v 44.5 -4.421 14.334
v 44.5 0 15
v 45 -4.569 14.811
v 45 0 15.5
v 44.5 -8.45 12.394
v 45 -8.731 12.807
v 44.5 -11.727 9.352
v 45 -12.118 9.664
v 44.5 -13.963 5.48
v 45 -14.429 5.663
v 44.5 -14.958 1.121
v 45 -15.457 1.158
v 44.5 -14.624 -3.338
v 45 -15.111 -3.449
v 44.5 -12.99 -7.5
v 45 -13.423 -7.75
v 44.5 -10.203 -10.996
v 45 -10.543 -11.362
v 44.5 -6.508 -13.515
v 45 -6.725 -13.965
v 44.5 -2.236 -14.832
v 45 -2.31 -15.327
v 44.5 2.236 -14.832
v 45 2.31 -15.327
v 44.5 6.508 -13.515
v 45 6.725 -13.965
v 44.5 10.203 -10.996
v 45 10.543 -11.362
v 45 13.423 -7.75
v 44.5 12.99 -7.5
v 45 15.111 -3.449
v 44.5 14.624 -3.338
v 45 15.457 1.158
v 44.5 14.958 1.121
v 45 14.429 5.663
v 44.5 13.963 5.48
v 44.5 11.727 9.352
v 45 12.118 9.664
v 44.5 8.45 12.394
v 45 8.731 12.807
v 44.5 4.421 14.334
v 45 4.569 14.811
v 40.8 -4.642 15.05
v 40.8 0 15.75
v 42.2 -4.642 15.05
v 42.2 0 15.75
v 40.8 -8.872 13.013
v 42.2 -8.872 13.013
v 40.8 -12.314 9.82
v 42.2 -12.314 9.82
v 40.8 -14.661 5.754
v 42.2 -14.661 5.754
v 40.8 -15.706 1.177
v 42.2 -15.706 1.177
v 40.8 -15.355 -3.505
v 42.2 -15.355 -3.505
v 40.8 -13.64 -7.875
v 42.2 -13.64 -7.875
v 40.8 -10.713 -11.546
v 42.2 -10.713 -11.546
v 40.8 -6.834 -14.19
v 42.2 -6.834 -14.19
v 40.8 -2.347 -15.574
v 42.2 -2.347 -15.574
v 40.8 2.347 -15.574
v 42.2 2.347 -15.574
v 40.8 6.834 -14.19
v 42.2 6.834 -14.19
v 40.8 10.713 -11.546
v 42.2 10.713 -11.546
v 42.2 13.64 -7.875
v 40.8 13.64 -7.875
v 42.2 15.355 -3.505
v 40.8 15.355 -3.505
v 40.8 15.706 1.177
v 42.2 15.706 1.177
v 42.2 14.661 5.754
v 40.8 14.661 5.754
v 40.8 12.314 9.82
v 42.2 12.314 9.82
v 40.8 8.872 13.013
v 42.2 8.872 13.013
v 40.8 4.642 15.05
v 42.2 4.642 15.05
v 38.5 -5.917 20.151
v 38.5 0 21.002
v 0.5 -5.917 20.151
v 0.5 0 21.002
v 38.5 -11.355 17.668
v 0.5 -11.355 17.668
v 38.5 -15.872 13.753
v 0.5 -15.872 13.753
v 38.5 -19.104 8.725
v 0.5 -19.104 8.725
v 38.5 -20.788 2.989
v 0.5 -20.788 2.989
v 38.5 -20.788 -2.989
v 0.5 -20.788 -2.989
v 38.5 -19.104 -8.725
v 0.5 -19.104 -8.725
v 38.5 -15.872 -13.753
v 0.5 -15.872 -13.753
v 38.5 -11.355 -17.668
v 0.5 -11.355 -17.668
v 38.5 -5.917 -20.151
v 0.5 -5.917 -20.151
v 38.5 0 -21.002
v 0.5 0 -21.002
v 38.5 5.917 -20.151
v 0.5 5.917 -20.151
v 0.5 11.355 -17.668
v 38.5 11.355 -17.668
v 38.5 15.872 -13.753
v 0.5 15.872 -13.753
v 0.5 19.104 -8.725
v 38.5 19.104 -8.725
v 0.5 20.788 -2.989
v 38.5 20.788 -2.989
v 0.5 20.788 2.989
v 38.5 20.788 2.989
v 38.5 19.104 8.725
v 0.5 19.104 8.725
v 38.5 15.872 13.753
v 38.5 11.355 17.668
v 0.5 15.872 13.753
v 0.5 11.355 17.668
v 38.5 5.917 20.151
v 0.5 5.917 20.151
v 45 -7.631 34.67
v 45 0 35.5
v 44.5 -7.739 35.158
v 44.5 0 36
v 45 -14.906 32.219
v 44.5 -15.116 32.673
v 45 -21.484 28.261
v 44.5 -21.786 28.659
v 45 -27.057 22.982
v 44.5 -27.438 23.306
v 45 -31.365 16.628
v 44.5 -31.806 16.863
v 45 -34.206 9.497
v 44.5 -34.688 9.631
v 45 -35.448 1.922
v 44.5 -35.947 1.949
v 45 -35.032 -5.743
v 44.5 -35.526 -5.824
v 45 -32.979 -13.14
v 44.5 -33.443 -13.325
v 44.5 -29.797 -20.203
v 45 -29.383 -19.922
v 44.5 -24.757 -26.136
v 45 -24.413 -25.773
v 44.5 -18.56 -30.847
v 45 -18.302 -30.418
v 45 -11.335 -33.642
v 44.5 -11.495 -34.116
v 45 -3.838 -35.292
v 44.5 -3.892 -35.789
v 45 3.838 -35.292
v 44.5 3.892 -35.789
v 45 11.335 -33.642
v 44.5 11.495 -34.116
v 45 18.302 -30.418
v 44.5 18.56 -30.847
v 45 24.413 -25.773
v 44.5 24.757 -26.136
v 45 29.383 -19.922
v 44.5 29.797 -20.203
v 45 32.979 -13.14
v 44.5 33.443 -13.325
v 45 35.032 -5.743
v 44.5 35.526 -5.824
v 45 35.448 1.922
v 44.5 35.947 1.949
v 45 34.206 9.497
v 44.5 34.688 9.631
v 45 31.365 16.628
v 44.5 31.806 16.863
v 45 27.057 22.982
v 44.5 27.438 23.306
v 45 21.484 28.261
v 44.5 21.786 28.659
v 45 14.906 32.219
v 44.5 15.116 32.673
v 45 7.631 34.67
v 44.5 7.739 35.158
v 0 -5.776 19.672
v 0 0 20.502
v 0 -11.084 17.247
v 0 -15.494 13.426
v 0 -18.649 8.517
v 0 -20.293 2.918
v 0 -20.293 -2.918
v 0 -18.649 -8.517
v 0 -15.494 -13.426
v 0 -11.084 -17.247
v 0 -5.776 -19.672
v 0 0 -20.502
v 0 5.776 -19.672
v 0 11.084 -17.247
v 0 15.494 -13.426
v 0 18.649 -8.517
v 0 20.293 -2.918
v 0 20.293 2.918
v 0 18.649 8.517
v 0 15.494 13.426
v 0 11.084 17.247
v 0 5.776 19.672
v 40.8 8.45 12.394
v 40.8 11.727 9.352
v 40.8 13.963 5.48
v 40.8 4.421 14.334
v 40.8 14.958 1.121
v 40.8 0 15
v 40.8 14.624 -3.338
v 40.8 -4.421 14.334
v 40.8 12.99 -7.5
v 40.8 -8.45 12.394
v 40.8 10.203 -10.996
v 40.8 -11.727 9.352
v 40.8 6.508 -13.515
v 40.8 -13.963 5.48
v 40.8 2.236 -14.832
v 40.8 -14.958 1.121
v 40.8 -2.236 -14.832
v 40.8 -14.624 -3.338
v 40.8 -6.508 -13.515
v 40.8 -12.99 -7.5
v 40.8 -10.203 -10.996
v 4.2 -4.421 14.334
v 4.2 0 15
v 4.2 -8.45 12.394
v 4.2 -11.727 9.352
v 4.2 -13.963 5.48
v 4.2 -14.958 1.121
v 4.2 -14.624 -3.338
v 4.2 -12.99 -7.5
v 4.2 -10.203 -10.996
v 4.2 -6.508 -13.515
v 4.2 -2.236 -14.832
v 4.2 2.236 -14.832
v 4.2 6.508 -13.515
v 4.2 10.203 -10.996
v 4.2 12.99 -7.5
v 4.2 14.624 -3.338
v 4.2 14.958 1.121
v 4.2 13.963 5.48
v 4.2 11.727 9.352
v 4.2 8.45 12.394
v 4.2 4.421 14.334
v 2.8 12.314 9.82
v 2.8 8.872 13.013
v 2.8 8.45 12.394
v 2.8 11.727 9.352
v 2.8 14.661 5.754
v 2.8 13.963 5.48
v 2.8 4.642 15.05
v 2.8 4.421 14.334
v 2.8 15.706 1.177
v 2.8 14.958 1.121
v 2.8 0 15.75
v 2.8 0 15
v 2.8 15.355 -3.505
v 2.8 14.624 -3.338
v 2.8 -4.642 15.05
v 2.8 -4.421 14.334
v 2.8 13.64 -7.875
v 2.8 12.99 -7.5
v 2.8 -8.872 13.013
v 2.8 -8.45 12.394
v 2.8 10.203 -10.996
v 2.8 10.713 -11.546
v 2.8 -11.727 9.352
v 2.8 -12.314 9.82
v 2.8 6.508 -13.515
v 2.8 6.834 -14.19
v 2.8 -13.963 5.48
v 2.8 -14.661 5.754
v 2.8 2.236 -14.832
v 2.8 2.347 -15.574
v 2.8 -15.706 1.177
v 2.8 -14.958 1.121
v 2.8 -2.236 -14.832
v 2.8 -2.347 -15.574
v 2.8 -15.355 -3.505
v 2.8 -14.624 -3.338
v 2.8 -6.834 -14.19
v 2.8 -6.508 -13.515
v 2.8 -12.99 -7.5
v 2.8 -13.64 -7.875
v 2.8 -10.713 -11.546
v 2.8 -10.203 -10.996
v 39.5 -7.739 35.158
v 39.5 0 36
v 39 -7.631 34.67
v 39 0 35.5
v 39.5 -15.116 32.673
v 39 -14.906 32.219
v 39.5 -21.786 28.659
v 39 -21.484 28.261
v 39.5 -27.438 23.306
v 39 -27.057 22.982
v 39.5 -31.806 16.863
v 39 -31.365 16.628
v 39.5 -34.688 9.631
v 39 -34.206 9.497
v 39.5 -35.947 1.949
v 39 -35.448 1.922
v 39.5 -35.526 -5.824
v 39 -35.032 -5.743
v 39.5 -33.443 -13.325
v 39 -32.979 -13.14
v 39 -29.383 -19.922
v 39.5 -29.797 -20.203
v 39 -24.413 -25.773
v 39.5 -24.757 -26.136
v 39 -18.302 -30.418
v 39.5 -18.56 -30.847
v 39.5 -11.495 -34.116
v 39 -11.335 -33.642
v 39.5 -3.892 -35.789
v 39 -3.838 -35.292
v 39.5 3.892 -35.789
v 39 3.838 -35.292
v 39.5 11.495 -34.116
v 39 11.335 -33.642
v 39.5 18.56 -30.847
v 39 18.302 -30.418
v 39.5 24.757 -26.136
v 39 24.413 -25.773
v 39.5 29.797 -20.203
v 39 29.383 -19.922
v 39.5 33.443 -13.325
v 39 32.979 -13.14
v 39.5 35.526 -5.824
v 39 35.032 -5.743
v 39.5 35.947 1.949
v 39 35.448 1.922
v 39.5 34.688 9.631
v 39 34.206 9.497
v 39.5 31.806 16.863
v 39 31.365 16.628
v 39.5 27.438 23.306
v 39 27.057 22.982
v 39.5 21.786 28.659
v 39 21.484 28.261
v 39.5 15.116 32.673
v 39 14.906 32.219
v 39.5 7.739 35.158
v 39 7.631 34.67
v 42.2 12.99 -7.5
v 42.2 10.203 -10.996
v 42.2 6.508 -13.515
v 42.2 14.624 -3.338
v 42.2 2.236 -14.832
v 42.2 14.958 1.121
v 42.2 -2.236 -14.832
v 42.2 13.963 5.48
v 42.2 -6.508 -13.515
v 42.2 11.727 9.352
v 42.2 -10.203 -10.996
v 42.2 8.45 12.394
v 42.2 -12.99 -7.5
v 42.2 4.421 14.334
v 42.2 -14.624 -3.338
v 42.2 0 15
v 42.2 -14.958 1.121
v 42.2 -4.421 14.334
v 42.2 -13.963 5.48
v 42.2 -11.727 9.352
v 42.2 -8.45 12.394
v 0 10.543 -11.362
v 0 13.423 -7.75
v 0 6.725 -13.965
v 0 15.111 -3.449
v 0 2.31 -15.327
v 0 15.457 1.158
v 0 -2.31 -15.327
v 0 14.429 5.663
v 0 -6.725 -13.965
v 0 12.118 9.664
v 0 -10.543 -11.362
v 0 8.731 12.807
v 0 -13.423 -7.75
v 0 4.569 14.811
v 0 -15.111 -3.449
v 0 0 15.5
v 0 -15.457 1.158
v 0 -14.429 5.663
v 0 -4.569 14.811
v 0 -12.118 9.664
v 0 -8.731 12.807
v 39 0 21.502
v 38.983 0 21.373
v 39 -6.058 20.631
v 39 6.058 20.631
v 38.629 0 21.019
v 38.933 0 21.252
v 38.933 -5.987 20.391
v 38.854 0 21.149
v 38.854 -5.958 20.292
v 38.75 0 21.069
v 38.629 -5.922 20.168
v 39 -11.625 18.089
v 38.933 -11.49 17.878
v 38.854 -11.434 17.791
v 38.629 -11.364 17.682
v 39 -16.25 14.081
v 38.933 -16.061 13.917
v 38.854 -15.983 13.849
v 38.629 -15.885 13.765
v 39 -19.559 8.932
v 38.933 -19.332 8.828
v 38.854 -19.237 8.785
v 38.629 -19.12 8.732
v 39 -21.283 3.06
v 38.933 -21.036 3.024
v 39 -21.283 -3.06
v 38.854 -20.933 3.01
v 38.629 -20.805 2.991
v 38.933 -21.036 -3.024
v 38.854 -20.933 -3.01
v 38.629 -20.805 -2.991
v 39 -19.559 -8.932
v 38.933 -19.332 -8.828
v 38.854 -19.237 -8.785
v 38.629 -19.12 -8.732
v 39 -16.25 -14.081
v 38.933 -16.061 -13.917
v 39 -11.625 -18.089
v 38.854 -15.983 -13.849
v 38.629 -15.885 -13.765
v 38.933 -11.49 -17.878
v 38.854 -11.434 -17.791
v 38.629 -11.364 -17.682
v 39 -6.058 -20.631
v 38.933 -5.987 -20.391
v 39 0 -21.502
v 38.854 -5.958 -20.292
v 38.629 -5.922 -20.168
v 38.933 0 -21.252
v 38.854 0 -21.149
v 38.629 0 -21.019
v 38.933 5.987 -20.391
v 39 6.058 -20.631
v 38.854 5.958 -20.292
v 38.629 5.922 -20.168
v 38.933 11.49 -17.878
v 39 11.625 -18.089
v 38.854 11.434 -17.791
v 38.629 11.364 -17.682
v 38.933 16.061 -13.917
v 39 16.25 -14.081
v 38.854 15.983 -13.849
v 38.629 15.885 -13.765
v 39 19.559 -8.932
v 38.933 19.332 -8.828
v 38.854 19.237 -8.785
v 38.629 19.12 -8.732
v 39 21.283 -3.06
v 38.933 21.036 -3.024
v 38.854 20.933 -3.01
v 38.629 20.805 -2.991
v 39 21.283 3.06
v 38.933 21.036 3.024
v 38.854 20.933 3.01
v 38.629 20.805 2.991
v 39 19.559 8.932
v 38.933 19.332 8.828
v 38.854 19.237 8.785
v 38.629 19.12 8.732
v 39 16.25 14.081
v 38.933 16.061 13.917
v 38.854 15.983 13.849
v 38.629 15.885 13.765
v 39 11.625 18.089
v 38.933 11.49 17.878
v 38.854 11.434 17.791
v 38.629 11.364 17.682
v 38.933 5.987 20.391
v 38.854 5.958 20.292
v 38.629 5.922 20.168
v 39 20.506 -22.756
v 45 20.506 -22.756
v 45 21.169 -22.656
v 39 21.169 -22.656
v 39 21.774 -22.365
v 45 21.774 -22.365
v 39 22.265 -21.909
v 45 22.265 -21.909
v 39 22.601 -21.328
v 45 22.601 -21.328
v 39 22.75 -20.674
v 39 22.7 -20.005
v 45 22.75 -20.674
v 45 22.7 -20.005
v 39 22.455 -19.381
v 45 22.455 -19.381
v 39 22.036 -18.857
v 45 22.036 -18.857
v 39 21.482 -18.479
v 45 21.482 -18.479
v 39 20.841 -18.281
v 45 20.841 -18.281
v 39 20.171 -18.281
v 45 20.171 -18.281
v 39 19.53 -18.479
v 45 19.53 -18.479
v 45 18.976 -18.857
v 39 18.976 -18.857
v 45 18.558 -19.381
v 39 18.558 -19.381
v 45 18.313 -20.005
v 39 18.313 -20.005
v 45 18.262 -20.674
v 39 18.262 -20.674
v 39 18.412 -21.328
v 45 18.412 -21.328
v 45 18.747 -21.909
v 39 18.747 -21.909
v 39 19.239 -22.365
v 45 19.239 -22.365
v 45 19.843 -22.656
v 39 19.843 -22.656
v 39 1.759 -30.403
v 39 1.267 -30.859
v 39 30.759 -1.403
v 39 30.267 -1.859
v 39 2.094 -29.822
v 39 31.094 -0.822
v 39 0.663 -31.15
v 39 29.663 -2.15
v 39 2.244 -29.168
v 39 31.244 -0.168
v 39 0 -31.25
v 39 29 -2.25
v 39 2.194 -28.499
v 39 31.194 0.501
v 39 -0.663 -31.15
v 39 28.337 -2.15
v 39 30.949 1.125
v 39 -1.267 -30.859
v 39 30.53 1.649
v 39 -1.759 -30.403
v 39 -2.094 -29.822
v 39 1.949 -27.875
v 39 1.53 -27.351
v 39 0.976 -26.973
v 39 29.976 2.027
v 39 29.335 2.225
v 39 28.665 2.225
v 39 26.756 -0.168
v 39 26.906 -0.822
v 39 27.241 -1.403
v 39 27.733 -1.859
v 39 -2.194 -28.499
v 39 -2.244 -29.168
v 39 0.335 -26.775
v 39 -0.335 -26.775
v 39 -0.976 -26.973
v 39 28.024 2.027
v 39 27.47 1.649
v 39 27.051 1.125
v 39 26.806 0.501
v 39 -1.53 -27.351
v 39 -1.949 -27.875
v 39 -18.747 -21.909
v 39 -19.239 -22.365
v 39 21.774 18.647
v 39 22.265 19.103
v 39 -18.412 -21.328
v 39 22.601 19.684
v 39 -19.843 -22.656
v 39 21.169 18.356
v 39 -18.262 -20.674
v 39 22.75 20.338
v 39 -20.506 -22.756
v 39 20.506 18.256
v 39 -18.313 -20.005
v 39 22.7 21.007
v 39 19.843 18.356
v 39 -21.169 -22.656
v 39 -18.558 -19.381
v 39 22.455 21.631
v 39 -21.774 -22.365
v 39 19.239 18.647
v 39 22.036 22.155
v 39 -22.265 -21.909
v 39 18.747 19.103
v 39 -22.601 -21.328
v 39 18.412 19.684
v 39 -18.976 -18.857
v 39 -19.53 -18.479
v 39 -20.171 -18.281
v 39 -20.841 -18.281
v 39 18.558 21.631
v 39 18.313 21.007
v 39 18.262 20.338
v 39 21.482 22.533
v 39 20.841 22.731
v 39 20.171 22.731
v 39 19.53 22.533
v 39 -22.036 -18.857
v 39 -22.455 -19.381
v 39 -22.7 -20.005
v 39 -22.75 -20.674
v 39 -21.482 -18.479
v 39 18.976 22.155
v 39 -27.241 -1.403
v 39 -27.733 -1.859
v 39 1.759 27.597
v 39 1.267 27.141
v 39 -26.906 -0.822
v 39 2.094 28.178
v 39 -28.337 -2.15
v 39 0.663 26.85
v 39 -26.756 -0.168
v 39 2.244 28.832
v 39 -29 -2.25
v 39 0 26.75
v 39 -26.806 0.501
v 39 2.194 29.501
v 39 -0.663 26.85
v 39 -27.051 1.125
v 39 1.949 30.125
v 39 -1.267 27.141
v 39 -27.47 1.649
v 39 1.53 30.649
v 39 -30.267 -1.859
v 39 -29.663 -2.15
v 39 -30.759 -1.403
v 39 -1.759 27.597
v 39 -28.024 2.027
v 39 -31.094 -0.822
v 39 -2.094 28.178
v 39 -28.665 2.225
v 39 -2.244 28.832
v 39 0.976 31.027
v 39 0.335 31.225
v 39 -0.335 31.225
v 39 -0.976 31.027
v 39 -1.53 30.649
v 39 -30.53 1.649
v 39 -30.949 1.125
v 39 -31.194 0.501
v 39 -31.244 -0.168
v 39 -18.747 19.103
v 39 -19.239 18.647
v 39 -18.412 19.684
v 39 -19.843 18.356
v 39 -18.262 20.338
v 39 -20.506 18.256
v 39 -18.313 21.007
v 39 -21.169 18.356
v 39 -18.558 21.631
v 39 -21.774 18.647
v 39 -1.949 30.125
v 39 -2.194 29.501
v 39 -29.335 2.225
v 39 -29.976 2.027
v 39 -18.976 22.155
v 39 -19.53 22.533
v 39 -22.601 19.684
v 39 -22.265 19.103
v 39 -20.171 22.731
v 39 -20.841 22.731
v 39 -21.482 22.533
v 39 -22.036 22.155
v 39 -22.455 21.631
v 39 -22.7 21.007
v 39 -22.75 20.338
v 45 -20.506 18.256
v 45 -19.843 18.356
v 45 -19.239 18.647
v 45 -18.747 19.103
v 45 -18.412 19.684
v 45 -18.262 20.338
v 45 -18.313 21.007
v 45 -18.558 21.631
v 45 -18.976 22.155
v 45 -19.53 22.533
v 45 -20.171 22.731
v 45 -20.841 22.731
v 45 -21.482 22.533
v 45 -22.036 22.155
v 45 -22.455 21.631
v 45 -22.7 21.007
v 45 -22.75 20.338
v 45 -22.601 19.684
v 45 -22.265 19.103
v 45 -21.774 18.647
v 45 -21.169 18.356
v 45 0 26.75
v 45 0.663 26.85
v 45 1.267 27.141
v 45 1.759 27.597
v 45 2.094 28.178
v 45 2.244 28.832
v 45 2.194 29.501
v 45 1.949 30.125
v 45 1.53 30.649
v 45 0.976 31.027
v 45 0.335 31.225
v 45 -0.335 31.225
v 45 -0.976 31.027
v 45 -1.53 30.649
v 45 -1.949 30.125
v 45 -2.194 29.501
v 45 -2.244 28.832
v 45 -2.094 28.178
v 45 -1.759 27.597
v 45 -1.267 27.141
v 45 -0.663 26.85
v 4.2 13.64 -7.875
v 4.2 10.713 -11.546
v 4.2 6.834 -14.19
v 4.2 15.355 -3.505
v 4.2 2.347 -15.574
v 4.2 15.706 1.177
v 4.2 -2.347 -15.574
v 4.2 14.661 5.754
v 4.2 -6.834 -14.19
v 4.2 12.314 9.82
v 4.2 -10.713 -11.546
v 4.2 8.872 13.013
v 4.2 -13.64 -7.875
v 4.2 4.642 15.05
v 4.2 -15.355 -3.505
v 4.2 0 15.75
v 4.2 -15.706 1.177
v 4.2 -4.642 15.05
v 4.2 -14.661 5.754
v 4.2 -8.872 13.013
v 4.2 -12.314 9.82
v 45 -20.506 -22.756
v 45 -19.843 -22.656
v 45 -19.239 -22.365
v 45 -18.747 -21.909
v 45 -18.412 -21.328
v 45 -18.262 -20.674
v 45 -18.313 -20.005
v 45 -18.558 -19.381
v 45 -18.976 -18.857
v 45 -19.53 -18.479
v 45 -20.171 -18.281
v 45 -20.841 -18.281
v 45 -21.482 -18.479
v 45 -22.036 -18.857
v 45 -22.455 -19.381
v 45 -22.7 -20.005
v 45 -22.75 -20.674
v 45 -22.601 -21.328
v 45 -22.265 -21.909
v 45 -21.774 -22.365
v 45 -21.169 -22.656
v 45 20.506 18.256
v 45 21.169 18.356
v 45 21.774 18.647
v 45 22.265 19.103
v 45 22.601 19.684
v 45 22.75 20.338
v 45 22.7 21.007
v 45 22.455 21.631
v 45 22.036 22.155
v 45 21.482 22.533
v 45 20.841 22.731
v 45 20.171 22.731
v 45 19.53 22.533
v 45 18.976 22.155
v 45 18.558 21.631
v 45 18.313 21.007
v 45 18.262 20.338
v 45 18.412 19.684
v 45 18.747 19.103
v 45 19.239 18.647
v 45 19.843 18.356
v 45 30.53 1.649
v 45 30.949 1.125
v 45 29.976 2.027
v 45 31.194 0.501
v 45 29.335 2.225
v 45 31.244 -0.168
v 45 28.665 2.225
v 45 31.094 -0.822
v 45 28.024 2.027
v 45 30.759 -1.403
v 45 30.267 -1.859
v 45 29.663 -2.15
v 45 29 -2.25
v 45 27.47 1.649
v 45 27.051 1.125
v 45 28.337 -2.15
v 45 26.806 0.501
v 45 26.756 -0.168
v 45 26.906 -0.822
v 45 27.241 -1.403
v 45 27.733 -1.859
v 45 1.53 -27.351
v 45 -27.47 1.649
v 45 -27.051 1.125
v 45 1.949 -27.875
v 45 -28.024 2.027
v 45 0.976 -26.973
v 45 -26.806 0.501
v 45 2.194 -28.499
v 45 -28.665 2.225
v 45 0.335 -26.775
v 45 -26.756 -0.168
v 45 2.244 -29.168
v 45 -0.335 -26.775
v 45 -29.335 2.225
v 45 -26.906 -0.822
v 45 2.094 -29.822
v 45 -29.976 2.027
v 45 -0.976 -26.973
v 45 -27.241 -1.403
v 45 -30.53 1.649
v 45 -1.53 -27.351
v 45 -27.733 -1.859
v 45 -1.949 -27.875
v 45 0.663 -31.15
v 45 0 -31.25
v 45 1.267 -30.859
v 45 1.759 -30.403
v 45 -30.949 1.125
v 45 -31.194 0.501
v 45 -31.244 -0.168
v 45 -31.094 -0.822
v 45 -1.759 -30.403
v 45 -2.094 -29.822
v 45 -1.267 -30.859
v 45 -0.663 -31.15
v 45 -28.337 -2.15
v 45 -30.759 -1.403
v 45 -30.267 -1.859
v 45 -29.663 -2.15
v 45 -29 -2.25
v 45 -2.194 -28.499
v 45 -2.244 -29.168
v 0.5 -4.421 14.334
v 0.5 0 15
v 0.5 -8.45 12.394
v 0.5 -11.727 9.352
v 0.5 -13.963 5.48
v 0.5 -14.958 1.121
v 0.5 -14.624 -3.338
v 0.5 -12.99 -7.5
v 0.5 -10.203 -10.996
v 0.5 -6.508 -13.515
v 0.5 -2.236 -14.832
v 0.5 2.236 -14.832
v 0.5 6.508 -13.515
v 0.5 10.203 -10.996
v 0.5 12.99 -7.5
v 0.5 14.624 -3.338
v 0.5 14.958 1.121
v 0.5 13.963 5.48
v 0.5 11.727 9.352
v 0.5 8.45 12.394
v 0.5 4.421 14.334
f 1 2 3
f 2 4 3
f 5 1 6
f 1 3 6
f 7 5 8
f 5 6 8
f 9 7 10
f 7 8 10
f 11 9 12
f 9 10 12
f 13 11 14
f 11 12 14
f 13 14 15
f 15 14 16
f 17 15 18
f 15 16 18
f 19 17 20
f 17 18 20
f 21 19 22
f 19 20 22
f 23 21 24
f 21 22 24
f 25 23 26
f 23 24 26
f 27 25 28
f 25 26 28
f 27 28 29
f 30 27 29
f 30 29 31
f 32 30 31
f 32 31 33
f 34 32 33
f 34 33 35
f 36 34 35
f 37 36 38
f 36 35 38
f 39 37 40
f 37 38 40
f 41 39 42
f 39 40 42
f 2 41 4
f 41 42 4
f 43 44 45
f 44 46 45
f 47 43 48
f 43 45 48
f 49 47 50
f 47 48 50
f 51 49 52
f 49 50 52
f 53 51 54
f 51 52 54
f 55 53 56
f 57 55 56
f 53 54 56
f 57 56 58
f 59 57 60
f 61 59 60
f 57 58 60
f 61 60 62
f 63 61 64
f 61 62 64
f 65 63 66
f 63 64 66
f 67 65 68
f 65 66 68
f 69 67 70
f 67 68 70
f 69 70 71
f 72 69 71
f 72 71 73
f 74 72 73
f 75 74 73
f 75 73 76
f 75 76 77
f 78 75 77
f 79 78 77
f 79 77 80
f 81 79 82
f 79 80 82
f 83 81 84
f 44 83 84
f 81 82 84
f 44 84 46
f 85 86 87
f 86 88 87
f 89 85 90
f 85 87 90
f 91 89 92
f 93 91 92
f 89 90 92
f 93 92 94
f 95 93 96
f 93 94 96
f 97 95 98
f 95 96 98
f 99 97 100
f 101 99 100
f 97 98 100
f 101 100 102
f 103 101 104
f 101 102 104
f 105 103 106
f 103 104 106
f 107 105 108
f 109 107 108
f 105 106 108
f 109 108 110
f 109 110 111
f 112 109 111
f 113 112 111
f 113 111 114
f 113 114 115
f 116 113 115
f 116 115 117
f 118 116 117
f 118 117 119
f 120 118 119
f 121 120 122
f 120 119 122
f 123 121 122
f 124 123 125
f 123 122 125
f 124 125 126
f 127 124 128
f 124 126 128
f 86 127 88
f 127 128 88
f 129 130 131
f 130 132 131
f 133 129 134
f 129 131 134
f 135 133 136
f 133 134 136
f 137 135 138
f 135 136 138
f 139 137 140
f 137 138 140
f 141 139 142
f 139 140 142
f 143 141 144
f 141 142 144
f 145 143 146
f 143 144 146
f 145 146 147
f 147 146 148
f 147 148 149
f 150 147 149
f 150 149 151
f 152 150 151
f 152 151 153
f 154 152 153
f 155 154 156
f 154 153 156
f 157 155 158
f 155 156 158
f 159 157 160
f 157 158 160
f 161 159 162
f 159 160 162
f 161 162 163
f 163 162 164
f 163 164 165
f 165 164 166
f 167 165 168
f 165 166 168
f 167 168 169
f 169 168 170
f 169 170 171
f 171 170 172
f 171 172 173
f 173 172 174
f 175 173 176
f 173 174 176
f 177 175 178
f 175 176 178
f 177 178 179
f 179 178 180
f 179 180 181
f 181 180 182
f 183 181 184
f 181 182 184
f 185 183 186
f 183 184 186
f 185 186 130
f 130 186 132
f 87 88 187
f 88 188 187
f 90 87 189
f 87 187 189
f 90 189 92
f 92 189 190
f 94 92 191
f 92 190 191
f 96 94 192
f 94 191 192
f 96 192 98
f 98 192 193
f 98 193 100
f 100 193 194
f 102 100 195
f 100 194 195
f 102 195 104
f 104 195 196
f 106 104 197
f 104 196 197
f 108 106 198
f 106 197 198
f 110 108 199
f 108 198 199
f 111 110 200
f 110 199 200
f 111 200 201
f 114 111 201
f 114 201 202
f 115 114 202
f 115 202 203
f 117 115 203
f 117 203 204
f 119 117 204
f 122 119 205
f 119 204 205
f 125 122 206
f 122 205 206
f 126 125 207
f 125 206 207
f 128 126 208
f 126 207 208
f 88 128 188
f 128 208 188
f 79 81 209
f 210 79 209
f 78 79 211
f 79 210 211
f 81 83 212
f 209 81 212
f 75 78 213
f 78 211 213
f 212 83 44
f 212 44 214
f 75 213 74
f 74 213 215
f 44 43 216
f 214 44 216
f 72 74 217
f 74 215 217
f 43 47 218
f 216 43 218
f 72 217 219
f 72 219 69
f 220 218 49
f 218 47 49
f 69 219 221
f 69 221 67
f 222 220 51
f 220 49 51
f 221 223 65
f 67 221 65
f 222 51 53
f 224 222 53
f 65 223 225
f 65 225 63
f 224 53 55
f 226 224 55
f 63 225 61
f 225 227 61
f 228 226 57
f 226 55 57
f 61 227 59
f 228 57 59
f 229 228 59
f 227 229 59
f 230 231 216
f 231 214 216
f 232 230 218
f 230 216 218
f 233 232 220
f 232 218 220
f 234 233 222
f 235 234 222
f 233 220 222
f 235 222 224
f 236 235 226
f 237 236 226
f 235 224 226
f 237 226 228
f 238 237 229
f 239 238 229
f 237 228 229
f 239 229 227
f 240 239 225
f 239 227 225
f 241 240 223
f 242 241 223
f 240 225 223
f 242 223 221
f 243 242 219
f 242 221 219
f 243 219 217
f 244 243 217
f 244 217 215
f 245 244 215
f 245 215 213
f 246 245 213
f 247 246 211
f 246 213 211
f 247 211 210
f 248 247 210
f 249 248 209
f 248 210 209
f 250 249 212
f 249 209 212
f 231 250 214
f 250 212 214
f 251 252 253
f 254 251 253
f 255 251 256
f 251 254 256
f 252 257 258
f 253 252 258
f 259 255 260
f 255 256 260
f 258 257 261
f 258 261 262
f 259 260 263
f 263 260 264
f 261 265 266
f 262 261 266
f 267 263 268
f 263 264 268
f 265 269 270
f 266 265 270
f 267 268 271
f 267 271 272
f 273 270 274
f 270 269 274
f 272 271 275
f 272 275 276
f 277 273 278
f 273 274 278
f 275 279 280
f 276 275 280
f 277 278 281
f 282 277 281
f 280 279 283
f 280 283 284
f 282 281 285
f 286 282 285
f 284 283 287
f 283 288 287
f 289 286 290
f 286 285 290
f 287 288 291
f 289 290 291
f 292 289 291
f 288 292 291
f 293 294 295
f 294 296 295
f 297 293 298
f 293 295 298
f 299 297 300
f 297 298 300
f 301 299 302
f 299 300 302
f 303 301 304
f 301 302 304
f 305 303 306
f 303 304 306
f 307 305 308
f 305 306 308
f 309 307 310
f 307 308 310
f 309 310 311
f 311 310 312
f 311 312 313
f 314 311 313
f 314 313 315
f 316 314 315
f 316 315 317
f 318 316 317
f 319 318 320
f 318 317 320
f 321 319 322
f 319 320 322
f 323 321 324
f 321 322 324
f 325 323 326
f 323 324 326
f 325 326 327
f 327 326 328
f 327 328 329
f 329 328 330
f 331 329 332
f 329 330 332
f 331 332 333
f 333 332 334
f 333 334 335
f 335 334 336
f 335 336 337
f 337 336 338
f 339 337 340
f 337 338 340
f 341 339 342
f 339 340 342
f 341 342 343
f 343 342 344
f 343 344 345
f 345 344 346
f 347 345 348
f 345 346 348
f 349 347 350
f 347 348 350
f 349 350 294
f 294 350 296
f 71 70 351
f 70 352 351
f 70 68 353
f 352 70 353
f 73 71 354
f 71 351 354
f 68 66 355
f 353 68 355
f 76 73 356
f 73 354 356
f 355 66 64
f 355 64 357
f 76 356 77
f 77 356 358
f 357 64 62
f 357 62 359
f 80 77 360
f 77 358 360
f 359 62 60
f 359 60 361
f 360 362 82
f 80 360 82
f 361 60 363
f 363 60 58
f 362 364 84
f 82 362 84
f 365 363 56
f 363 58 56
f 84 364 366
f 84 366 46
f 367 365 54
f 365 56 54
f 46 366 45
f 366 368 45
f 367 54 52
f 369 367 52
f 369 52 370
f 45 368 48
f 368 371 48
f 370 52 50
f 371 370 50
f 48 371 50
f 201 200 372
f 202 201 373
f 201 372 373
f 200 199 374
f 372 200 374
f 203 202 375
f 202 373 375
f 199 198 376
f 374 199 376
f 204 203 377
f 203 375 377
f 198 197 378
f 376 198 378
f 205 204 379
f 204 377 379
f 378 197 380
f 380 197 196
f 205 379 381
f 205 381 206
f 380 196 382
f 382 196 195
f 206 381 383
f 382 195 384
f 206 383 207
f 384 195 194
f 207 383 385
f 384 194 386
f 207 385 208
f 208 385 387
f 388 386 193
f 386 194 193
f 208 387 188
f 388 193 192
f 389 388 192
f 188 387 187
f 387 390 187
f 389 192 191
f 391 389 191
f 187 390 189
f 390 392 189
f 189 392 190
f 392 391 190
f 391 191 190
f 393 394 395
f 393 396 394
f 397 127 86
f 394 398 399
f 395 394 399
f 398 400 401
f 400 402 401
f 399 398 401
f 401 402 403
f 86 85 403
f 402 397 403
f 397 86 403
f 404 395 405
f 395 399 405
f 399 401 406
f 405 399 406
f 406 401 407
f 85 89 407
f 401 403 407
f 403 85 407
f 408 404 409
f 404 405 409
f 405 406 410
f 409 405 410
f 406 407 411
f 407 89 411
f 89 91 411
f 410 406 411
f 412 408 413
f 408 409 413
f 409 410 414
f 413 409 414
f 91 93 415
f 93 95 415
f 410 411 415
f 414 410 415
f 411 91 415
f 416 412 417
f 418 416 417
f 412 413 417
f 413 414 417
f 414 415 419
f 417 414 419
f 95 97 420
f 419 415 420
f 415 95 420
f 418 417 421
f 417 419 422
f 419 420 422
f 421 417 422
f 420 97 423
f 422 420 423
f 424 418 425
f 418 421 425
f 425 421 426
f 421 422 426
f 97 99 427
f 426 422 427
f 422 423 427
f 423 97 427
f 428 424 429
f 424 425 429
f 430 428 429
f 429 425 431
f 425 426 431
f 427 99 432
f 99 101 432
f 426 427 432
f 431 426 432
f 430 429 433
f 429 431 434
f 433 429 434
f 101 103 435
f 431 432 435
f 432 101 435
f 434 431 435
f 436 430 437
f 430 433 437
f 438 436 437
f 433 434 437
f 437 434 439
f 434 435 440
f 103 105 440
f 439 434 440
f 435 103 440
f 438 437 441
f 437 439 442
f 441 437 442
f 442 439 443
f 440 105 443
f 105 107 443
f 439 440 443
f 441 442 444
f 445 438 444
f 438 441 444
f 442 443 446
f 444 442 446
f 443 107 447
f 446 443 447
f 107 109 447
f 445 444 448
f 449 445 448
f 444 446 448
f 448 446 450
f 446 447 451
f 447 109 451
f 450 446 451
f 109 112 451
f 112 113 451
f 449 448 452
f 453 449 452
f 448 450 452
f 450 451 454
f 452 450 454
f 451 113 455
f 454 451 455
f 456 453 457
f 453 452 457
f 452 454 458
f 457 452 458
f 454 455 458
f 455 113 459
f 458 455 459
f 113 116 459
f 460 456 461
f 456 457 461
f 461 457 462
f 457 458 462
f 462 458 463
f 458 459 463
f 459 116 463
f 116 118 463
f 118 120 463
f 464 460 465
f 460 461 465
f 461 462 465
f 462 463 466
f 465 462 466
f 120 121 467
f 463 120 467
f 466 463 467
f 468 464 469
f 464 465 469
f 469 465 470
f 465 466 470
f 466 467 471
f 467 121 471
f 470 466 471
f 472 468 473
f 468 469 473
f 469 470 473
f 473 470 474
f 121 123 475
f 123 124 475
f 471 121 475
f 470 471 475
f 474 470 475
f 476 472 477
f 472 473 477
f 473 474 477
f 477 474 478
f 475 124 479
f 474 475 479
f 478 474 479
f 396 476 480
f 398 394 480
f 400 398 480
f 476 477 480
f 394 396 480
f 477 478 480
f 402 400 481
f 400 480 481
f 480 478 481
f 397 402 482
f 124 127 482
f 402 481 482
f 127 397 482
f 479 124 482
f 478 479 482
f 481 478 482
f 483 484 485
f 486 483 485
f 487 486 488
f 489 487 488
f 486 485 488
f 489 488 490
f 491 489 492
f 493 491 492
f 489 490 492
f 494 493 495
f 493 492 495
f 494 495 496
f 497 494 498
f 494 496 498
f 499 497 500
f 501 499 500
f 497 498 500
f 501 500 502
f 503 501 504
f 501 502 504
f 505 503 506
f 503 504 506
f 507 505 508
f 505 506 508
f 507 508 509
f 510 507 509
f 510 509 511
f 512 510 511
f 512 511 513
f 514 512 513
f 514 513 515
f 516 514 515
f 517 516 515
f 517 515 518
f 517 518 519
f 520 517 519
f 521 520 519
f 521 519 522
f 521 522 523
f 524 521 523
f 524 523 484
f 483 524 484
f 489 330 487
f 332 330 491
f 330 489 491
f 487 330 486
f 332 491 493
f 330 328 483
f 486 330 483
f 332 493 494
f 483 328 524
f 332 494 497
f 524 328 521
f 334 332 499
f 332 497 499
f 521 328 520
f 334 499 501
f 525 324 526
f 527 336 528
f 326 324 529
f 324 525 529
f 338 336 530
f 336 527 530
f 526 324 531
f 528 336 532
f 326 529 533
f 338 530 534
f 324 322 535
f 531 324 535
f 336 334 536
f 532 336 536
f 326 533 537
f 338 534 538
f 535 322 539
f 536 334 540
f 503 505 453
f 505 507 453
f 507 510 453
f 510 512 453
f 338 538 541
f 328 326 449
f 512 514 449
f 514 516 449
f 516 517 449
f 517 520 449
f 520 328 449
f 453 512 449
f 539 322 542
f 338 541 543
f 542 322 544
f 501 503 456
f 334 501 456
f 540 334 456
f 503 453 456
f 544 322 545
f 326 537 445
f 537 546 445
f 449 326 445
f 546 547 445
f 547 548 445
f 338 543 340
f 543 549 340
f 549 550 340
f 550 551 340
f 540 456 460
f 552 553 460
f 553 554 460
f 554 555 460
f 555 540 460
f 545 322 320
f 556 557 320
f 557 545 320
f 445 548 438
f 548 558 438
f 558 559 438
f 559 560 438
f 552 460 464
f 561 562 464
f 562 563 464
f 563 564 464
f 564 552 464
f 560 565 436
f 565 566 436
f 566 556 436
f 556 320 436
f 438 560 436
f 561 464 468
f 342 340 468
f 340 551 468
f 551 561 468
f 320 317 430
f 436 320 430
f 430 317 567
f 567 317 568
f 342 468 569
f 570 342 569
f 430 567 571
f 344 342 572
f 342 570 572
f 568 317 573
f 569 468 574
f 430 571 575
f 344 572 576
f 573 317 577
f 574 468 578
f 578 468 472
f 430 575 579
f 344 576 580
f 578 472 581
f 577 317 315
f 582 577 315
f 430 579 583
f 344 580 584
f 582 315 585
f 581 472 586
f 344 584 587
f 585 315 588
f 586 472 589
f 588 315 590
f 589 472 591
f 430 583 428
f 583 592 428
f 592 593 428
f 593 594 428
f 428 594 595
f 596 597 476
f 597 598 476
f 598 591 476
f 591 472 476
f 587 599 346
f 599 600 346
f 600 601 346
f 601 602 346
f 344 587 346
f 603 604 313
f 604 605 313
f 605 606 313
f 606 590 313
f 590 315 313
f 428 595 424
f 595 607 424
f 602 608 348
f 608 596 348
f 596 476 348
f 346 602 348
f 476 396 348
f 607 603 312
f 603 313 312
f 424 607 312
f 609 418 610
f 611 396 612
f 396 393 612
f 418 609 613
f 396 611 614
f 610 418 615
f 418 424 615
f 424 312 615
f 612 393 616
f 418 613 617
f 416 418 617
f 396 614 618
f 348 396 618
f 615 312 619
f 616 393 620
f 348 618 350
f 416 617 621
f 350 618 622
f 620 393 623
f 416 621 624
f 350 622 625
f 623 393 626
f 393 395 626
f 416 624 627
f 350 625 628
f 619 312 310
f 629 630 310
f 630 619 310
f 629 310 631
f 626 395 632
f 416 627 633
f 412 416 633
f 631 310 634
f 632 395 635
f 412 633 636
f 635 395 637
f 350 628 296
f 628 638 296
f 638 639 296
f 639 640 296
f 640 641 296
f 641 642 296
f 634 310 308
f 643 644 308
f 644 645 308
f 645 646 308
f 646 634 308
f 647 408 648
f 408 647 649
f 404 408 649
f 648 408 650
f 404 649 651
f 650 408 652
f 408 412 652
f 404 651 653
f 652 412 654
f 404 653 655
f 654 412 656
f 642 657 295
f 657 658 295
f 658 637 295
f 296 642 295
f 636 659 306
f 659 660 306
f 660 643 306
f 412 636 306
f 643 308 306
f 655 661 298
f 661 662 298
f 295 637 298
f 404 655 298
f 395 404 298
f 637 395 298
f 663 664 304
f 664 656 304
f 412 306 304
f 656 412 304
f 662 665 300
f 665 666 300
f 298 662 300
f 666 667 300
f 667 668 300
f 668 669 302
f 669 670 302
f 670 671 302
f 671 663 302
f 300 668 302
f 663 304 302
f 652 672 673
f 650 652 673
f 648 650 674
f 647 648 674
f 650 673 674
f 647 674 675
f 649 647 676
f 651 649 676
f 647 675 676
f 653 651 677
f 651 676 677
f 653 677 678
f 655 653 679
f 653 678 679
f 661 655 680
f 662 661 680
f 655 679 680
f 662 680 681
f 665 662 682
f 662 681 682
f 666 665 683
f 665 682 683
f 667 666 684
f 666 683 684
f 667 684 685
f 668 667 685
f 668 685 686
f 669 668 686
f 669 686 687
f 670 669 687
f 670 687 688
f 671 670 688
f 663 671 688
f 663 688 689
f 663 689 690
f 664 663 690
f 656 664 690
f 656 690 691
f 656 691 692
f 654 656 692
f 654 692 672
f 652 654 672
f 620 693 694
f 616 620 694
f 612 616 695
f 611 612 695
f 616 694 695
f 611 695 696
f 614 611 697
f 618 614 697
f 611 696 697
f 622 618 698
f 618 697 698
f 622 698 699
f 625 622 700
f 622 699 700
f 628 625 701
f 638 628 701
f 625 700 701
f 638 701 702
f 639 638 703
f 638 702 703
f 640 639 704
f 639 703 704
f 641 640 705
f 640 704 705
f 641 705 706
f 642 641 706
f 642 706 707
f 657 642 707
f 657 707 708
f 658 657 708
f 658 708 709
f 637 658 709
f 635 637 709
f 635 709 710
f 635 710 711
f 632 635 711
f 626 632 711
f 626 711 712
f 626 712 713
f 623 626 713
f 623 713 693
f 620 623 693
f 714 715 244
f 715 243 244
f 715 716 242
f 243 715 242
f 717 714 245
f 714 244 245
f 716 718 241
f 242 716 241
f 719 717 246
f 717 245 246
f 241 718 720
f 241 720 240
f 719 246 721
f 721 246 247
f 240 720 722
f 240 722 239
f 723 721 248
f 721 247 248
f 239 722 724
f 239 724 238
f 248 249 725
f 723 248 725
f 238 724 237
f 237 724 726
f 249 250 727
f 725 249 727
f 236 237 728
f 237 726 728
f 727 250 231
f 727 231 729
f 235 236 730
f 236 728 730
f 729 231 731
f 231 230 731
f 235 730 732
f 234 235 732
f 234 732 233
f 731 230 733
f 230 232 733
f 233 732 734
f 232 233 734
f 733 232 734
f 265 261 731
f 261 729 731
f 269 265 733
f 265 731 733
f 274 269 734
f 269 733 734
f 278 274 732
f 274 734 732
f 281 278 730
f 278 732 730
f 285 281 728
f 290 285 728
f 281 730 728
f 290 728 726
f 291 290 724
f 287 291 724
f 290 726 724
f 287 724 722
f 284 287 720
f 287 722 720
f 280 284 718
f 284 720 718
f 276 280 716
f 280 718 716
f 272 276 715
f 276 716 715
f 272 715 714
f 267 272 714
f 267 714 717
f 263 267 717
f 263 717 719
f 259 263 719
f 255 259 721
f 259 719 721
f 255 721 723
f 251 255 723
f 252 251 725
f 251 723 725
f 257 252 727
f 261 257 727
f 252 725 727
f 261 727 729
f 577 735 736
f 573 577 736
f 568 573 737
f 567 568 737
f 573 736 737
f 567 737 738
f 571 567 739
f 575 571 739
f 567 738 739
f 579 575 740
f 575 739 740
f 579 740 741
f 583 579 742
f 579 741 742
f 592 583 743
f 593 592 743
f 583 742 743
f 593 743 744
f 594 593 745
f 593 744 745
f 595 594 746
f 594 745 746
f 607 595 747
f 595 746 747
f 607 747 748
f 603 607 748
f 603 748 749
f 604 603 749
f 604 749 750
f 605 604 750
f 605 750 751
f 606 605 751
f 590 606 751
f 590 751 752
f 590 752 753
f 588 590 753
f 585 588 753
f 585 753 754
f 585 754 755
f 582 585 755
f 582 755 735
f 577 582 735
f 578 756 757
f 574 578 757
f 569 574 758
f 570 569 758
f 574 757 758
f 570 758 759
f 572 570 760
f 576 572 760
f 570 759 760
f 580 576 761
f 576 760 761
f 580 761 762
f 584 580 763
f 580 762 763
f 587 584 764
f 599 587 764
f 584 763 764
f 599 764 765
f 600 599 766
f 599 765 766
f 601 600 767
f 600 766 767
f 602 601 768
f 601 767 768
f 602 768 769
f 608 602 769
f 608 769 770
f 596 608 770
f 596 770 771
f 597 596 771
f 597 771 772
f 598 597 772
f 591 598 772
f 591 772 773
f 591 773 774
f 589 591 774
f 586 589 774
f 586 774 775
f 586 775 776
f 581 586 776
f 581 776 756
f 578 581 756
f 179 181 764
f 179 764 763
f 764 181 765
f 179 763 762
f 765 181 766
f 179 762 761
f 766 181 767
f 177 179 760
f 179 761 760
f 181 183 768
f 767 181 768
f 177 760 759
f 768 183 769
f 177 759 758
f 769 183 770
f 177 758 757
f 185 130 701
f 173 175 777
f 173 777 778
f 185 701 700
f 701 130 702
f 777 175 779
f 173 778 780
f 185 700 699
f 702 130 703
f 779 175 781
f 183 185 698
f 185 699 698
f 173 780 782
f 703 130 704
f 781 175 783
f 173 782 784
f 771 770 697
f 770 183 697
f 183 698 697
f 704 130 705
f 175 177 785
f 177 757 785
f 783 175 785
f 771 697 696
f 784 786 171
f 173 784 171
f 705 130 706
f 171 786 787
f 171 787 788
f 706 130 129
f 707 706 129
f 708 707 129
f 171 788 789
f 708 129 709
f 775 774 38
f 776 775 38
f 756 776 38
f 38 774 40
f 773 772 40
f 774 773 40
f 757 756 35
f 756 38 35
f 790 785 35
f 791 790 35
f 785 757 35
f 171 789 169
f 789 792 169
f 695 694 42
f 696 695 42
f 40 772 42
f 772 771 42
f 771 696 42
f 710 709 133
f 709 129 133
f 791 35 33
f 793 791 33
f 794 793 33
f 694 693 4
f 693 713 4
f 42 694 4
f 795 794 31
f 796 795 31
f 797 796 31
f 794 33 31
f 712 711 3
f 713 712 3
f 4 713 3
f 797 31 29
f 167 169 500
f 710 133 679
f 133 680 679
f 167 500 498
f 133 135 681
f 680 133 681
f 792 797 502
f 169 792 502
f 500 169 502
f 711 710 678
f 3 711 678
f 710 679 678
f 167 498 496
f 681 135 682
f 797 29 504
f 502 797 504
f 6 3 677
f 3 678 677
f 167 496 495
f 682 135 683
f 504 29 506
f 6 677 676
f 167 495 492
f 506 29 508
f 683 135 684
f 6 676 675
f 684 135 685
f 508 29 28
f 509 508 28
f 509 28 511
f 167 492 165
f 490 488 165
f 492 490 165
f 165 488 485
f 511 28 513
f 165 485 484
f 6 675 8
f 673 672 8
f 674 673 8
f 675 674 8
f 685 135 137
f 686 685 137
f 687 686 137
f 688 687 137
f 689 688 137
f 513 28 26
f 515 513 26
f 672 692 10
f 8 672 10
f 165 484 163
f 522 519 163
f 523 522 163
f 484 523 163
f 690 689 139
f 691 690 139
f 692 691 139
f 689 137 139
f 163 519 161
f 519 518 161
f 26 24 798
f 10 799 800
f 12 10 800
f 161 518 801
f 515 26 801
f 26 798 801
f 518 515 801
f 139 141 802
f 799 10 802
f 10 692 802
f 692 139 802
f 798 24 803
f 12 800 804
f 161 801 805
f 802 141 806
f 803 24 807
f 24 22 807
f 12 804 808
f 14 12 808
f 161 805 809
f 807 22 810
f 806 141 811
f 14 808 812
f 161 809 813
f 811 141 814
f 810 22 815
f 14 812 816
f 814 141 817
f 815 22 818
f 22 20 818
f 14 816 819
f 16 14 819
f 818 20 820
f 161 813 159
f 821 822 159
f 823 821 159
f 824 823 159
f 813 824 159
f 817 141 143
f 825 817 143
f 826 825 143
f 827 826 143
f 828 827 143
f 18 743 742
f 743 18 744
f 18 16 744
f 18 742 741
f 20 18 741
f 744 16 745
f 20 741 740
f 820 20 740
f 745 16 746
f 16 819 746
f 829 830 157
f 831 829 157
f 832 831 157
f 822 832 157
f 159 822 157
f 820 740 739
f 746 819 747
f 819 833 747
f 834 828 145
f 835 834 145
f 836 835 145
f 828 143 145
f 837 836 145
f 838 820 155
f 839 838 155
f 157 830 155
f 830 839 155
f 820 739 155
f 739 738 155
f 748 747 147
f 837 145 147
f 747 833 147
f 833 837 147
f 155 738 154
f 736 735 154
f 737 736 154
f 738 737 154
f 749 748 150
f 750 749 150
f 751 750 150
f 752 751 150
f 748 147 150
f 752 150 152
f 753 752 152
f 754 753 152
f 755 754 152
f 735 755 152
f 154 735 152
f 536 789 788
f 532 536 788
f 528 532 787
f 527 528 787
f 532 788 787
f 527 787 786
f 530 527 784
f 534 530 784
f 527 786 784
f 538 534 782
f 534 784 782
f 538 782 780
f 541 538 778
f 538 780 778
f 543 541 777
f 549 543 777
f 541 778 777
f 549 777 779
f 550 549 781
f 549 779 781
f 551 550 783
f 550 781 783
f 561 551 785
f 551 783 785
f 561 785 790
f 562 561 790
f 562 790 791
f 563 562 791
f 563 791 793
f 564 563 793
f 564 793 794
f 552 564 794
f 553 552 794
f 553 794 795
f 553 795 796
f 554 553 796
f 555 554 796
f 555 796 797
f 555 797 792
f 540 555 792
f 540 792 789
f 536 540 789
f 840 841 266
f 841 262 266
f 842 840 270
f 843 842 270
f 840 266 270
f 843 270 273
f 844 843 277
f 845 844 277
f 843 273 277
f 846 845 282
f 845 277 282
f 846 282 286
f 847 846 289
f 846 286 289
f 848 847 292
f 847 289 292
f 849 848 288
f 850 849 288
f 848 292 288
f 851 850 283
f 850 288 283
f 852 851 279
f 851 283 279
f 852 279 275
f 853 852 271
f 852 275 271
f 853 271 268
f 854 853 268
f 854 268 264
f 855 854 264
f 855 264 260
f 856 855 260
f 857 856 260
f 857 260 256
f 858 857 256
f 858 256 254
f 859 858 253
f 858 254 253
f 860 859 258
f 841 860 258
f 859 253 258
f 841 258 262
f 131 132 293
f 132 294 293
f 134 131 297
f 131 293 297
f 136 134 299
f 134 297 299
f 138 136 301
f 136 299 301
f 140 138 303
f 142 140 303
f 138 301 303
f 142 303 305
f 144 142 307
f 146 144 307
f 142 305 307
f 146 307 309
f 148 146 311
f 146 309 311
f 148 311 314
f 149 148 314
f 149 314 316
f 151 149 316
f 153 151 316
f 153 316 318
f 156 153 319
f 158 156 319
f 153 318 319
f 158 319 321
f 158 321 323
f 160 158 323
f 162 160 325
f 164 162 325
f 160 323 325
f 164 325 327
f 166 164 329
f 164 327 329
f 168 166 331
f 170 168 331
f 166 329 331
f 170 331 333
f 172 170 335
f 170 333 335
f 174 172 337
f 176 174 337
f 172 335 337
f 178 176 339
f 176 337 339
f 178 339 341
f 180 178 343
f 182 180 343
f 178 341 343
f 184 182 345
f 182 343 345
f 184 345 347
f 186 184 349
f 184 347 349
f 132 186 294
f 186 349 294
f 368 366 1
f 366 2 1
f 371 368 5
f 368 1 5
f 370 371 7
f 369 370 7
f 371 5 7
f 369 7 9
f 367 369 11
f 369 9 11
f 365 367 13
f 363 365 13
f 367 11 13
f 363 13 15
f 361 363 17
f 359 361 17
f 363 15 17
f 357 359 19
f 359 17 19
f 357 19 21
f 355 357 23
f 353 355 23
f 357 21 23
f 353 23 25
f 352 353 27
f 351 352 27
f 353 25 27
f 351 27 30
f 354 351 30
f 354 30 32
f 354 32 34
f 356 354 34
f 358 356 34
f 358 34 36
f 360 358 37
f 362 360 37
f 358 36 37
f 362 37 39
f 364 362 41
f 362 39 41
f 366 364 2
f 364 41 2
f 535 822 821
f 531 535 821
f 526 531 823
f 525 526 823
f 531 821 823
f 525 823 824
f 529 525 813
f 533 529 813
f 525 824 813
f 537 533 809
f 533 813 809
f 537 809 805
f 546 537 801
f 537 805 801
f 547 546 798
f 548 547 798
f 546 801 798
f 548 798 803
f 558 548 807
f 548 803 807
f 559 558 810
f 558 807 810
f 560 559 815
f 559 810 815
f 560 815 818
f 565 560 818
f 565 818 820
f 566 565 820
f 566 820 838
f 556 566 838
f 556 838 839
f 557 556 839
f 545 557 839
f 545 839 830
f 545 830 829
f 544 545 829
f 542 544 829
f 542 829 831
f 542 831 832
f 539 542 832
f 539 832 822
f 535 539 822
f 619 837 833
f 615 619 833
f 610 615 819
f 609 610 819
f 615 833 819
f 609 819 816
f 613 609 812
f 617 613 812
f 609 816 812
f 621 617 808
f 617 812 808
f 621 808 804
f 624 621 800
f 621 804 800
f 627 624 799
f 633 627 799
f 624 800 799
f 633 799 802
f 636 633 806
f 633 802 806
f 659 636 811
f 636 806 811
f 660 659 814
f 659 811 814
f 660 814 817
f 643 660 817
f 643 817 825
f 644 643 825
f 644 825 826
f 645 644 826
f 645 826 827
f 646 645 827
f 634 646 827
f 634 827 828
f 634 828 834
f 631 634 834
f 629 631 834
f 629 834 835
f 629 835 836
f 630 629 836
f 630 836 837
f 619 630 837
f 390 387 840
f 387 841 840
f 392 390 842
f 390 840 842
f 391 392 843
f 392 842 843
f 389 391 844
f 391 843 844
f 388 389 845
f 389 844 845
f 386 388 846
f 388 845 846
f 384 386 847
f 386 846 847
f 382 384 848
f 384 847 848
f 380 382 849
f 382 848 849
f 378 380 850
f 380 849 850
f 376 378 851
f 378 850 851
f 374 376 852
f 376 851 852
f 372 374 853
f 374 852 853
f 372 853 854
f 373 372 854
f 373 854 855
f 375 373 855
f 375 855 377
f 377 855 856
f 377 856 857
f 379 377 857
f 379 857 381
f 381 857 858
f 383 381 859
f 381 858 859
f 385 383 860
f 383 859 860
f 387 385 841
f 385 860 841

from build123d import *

# Parameters (mm, degrees)
M4_GEWINDEBOHRUNG1_D            = 3.3
M4_GEWINDEBOHRUNG1_DEPTH        = 13
M4_GEWINDEBOHRUNG1_TIP          = 0.991420021
SKIZZE8_R                       = 2.25
SCHNITT_LINEAR_AUSTRAGEN1_DEPTH = 68.948509917


with BuildPart() as part:
    # Skizze2 → Rotation1 (revolve)
    with BuildSketch(Plane(origin=(0, 0, 0), x_dir=(1, 0, 0), z_dir=(0, 1, 0)), mode=Mode.PRIVATE) as rotation1_sk:
        with BuildLine():
            Line((33.5, 21.002136322), (33.5, 15))
            Line((33.5, 15), (40.8, 15))
            Line((40.8, 15), (40.8, 15.75))
            Line((40.8, 15.75), (42.2, 15.75))
            Line((42.2, 15.75), (42.2, 15))
            Line((42.2, 15), (44.5, 15))
            Line((44.5, 15), (45, 15.5))
            Line((45, 15.5), (45, 20))
            Line((45, 20), (45, 35.5))
            Line((45, 35.5), (44.5, 36))
            Line((44.5, 36), (39.5, 36))
            Line((39.5, 36), (39, 35.5))
            Line((39, 35.5), (39, 21.502136322))
            ThreePointArc((39, 21.502136322), (38.853553391, 21.148582931), (38.5, 21.002136322))
            Line((38.5, 21.002136322), (33.5, 21.002136322))
        make_face()
        Polygon((0, 20.502136322), (0, 15.5), (0.5, 15), (2.8, 15), (2.8, 15.75), (4.2, 15.75), (4.2, 15), (33.5, 15), (33.5, 21.002136322), (0.5, 21.002136322), align=None)
    revolve(rotation1_sk.sketch.rotate(Axis((0, 0, 0), (1, 0, 0)), 180), axis=Axis((0, 0, 0), (1, 0, 0)))

    # M4 Gewindebohrung1
    with Locations(Plane(origin=(67, 14.142135624, 14.142135624), x_dir=(0, 0, 1), z_dir=(1, 0, 0))):
        with Locations((0, 0), (-14.142135624, -5.857864376), (-28.284271248, 0), (-34.142135624, 14.142135624), (-28.284271248, 28.284271248), (-14.142135624, 34.142135624), (0, 28.284271248), (5.857864376, 14.142135624)):
            Hole(M4_GEWINDEBOHRUNG1_D / 2, depth=M4_GEWINDEBOHRUNG1_DEPTH)
            with Locations((0, 0, -(M4_GEWINDEBOHRUNG1_DEPTH + M4_GEWINDEBOHRUNG1_TIP / 2))):  # 118° drill point
                Cone(0, M4_GEWINDEBOHRUNG1_D / 2, M4_GEWINDEBOHRUNG1_TIP, mode=Mode.SUBTRACT)

    # Skizze8 → Schnitt-Linear austragen1 (cut, through all)
    with BuildSketch(Plane(origin=(45, 0, 0), x_dir=(0, 0, -1), z_dir=(1, 0, 0))):
        with Locations((0, 29)):
            Circle(SKIZZE8_R)
        with Locations((20.506096654, 20.506096654)):
            Circle(SKIZZE8_R)
        with Locations((29, 0)):
            Circle(SKIZZE8_R)
        with Locations((20.506096654, -20.506096654)):
            Circle(SKIZZE8_R)
        with Locations((0, -29)):
            Circle(SKIZZE8_R)
        with Locations((-20.506096654, -20.506096654)):
            Circle(SKIZZE8_R)
        with Locations((-29, 0)):
            Circle(SKIZZE8_R)
        with Locations((-20.506096654, 20.506096654)):
            Circle(SKIZZE8_R)
    extrude(amount=-SCHNITT_LINEAR_AUSTRAGEN1_DEPTH, mode=Mode.SUBTRACT)


solid = part.part
